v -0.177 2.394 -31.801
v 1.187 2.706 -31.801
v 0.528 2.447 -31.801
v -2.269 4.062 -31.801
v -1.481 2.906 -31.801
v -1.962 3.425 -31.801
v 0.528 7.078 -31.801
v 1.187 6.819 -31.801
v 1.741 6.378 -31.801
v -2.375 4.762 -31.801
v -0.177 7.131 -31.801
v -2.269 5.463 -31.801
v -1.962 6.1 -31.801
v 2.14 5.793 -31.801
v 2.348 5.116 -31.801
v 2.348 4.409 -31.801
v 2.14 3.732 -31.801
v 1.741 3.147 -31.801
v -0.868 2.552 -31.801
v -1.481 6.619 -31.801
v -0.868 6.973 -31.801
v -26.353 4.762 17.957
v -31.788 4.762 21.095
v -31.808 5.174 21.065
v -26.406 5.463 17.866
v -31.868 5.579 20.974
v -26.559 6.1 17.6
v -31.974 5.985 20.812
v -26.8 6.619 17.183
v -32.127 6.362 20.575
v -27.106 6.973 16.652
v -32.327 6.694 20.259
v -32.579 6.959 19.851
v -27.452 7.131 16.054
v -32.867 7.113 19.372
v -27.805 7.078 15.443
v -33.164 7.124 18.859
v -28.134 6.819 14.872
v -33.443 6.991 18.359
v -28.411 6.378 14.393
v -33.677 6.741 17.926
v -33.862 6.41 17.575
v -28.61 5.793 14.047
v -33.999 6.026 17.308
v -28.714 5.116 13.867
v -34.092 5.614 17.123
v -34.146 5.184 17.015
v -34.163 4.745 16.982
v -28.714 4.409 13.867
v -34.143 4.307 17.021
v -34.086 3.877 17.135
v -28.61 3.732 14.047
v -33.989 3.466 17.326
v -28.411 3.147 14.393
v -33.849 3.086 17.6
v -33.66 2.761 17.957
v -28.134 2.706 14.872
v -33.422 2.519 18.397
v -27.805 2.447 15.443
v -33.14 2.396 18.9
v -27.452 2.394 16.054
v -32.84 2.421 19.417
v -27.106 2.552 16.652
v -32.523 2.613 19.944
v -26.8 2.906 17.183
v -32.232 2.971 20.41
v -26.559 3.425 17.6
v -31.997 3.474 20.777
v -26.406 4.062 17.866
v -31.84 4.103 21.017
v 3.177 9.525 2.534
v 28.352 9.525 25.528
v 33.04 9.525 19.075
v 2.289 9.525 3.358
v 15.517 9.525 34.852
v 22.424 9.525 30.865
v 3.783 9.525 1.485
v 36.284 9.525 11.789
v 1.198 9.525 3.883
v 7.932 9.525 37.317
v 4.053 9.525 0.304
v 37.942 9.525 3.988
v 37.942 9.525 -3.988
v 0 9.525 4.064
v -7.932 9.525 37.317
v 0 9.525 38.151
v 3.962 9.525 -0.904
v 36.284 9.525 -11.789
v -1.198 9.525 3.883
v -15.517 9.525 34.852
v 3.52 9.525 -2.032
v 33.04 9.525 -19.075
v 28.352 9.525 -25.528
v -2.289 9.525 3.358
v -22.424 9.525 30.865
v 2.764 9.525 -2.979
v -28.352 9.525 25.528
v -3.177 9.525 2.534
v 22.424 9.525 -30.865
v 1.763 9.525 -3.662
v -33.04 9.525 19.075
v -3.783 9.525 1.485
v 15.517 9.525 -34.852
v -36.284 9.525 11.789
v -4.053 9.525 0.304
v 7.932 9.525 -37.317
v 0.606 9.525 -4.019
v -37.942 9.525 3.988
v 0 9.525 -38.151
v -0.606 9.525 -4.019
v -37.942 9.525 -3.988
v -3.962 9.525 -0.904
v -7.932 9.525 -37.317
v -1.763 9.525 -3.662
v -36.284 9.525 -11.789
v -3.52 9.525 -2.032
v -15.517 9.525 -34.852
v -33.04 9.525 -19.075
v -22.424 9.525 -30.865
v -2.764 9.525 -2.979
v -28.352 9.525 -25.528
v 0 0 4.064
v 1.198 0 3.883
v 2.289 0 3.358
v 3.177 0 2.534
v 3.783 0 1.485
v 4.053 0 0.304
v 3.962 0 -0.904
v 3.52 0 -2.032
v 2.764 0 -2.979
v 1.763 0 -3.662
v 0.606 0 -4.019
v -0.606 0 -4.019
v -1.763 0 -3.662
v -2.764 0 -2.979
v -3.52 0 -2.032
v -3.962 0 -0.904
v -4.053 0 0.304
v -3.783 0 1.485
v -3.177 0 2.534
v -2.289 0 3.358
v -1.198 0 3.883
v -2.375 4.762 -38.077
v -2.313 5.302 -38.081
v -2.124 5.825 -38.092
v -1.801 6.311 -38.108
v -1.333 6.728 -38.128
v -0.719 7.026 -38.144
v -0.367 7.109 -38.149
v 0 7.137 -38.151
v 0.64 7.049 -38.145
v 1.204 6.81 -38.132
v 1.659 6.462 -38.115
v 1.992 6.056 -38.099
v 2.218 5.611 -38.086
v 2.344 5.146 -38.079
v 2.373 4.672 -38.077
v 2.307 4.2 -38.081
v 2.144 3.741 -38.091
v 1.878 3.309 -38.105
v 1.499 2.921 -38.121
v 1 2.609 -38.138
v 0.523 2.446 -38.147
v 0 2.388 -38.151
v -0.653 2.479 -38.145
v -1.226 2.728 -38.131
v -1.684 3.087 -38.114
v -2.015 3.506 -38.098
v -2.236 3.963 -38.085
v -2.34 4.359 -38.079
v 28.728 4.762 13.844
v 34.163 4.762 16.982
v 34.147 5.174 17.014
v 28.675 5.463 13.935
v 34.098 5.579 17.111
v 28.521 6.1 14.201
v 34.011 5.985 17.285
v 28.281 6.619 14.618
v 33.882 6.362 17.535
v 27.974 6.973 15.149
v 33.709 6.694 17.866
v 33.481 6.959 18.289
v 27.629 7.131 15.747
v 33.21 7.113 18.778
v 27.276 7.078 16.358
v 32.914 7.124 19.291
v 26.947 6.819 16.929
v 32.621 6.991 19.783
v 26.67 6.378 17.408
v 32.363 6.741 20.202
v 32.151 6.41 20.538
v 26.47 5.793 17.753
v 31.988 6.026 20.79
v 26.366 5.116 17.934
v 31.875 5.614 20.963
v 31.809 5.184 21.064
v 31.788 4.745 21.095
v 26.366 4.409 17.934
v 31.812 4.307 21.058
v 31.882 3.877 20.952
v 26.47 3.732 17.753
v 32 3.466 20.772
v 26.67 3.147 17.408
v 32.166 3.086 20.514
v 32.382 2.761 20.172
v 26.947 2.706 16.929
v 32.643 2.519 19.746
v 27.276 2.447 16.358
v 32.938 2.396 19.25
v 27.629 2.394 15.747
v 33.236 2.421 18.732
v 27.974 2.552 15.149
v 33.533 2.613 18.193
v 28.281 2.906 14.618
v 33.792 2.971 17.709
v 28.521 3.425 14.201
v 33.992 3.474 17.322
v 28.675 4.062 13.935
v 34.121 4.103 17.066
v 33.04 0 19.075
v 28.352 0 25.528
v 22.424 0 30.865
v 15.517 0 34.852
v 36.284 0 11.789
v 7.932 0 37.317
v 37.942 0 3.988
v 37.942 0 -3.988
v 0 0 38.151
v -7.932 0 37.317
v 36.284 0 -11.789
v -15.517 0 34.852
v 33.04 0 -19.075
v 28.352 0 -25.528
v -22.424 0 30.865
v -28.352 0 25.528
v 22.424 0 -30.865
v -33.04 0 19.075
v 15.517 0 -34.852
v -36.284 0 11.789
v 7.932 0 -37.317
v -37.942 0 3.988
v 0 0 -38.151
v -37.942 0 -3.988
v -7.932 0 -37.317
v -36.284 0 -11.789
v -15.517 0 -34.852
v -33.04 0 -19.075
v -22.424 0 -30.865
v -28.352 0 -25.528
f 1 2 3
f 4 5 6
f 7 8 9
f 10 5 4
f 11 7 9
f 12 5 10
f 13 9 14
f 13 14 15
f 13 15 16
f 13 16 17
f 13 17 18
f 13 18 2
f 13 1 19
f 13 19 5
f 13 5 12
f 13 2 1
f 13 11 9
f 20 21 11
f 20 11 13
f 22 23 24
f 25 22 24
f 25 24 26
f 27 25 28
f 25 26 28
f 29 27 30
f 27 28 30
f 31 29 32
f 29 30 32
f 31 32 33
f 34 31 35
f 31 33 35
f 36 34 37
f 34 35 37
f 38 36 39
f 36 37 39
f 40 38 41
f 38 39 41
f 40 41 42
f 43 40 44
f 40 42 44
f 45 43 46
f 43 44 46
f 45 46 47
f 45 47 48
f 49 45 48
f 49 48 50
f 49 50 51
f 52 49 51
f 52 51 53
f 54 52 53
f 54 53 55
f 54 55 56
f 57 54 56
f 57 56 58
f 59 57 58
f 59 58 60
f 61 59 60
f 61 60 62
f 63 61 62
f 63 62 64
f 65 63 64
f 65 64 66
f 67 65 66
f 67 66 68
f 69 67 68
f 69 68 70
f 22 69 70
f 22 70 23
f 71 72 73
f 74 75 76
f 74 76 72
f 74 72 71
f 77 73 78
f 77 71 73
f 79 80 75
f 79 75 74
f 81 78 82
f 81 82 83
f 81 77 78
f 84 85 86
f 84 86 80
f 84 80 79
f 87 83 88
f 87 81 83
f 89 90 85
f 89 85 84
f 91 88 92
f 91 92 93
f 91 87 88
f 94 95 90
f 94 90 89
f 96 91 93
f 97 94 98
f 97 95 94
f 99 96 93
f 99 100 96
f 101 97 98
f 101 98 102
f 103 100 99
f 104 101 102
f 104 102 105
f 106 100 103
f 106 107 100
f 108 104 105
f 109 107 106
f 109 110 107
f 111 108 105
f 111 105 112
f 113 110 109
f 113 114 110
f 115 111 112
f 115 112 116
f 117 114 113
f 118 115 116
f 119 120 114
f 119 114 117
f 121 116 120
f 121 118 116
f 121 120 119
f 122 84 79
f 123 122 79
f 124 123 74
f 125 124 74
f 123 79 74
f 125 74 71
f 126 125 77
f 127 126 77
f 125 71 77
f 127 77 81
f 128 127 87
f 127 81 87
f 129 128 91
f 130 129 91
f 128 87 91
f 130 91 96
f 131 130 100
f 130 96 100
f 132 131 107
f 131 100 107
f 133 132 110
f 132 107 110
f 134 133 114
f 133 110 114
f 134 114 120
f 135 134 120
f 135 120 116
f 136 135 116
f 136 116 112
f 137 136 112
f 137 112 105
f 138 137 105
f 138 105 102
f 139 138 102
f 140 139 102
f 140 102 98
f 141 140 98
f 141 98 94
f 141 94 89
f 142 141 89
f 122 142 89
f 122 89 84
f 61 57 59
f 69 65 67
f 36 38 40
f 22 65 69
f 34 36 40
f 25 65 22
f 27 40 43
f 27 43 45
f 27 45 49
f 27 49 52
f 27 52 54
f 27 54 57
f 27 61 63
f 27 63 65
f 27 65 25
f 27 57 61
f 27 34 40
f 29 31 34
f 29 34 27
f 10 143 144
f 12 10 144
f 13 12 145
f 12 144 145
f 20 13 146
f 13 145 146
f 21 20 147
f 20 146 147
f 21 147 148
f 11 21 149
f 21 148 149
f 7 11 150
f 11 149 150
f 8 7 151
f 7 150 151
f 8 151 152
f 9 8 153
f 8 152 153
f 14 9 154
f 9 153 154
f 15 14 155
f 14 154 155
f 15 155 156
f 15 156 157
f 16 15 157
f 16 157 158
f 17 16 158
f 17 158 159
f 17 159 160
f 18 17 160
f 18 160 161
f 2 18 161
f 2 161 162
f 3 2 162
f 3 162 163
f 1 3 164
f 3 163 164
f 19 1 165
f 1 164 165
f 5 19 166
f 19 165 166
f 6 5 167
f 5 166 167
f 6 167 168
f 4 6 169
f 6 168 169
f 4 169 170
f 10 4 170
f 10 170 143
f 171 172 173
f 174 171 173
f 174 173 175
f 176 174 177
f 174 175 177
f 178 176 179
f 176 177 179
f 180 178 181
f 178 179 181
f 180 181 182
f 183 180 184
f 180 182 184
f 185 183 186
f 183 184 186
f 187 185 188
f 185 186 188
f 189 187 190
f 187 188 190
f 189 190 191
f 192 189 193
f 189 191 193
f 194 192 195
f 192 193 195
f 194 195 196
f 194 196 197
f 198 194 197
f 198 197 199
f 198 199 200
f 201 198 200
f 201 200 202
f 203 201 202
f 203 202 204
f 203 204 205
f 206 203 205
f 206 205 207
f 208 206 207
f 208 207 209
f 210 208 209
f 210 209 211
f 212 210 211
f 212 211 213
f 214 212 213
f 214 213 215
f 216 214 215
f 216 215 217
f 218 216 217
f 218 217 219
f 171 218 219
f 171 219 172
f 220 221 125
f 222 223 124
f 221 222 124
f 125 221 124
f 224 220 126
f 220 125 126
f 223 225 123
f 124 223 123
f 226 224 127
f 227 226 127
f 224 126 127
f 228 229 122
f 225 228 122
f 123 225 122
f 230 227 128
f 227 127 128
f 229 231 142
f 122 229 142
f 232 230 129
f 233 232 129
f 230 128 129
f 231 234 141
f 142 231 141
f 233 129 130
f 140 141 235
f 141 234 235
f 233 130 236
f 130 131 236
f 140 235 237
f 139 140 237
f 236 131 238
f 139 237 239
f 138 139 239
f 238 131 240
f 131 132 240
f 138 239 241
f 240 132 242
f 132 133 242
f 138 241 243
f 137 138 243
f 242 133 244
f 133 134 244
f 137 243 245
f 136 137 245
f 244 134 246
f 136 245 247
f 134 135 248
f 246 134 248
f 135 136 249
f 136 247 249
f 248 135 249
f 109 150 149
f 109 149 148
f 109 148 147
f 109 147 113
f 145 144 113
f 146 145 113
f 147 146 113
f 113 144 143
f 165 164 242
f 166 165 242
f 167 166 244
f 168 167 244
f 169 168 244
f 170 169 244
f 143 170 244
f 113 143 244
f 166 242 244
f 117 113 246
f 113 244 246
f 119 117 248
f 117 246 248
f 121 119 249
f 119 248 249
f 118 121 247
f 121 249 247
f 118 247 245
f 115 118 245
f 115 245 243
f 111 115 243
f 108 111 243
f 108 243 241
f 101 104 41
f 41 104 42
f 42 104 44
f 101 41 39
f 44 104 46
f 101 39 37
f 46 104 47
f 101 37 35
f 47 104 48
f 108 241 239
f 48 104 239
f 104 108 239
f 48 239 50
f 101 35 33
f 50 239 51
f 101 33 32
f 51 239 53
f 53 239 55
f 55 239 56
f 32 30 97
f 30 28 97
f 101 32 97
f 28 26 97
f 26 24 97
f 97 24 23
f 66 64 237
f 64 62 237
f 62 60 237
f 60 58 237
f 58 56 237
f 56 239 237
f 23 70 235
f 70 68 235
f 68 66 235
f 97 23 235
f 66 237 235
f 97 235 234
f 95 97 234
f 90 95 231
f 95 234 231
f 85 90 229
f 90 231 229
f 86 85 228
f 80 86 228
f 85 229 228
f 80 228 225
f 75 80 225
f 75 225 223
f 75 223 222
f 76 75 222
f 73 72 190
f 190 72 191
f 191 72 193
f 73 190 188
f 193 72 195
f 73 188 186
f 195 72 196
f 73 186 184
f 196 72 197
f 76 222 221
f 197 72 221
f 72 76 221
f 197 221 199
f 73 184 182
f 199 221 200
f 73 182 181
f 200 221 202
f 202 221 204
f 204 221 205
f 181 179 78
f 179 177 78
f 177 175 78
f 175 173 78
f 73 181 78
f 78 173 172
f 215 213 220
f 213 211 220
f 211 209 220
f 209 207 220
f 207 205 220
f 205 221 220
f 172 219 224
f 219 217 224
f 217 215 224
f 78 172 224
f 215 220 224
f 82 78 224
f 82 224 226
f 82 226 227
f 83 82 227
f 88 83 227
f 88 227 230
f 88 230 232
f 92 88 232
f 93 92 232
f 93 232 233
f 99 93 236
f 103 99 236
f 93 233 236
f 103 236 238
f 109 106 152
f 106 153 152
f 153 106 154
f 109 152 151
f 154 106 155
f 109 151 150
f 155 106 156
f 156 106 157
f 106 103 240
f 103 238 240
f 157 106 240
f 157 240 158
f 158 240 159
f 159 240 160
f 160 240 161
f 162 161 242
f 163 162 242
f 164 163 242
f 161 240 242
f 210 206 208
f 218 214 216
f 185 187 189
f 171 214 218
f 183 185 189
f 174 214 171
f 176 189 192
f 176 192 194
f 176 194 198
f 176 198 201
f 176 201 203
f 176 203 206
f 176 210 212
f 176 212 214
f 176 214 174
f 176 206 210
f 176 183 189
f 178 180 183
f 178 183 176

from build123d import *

# Parameters (mm, degrees)
SKETCH1_R           = 38.1508
BOSS_EXTRUDE1_DEPTH = 9.525
SKETCH4_R           = 2.3749
CUT_EXTRUDE2_DEPTH  = 6.35
CIRPATTERN1_COUNT   = 3
SKETCH6_R           = 4.064
CUT_EXTRUDE4_DEPTH  = 55.787705953


with BuildPart() as part:
    # Sketch1 → Boss-Extrude1 (new body)
    with BuildSketch(Plane(origin=(0, 0, 0), x_dir=(1, 0, 0), z_dir=(0, 1, 0))):
        Circle(SKETCH1_R)
    extrude(amount=BOSS_EXTRUDE1_DEPTH)

    # Sketch4 → Cut-Extrude2 (cut)
    with BuildSketch(Plane(origin=(-33.039561975, 0, 19.0754), x_dir=(0, -1, 0), z_dir=(-0.8660254037844433, 0, 0.49999999999999195))):
        with Locations((-4.7625, 0)):
            Circle(SKETCH4_R)
    cut_extrude2 = extrude(amount=-CUT_EXTRUDE2_DEPTH, mode=Mode.SUBTRACT)

    # CirPattern1: Cut-Extrude2 ×3 about axis
    cirpattern1_axis = Axis((0, 10.00125, 0), (0, -1, 0))
    for i in range(1, CIRPATTERN1_COUNT):
        add(cut_extrude2.rotate(cirpattern1_axis, i * 360 / CIRPATTERN1_COUNT), mode=Mode.SUBTRACT)

    # Sketch6 → Cut-Extrude4 (cut, through all)
    with BuildSketch(Plane(origin=(0, 9.525, 0), x_dir=(1, 0, 0), z_dir=(0, 1, 0))):
        Circle(SKETCH6_R)
    extrude(amount=-CUT_EXTRUDE4_DEPTH, mode=Mode.SUBTRACT)


solid = part.part
